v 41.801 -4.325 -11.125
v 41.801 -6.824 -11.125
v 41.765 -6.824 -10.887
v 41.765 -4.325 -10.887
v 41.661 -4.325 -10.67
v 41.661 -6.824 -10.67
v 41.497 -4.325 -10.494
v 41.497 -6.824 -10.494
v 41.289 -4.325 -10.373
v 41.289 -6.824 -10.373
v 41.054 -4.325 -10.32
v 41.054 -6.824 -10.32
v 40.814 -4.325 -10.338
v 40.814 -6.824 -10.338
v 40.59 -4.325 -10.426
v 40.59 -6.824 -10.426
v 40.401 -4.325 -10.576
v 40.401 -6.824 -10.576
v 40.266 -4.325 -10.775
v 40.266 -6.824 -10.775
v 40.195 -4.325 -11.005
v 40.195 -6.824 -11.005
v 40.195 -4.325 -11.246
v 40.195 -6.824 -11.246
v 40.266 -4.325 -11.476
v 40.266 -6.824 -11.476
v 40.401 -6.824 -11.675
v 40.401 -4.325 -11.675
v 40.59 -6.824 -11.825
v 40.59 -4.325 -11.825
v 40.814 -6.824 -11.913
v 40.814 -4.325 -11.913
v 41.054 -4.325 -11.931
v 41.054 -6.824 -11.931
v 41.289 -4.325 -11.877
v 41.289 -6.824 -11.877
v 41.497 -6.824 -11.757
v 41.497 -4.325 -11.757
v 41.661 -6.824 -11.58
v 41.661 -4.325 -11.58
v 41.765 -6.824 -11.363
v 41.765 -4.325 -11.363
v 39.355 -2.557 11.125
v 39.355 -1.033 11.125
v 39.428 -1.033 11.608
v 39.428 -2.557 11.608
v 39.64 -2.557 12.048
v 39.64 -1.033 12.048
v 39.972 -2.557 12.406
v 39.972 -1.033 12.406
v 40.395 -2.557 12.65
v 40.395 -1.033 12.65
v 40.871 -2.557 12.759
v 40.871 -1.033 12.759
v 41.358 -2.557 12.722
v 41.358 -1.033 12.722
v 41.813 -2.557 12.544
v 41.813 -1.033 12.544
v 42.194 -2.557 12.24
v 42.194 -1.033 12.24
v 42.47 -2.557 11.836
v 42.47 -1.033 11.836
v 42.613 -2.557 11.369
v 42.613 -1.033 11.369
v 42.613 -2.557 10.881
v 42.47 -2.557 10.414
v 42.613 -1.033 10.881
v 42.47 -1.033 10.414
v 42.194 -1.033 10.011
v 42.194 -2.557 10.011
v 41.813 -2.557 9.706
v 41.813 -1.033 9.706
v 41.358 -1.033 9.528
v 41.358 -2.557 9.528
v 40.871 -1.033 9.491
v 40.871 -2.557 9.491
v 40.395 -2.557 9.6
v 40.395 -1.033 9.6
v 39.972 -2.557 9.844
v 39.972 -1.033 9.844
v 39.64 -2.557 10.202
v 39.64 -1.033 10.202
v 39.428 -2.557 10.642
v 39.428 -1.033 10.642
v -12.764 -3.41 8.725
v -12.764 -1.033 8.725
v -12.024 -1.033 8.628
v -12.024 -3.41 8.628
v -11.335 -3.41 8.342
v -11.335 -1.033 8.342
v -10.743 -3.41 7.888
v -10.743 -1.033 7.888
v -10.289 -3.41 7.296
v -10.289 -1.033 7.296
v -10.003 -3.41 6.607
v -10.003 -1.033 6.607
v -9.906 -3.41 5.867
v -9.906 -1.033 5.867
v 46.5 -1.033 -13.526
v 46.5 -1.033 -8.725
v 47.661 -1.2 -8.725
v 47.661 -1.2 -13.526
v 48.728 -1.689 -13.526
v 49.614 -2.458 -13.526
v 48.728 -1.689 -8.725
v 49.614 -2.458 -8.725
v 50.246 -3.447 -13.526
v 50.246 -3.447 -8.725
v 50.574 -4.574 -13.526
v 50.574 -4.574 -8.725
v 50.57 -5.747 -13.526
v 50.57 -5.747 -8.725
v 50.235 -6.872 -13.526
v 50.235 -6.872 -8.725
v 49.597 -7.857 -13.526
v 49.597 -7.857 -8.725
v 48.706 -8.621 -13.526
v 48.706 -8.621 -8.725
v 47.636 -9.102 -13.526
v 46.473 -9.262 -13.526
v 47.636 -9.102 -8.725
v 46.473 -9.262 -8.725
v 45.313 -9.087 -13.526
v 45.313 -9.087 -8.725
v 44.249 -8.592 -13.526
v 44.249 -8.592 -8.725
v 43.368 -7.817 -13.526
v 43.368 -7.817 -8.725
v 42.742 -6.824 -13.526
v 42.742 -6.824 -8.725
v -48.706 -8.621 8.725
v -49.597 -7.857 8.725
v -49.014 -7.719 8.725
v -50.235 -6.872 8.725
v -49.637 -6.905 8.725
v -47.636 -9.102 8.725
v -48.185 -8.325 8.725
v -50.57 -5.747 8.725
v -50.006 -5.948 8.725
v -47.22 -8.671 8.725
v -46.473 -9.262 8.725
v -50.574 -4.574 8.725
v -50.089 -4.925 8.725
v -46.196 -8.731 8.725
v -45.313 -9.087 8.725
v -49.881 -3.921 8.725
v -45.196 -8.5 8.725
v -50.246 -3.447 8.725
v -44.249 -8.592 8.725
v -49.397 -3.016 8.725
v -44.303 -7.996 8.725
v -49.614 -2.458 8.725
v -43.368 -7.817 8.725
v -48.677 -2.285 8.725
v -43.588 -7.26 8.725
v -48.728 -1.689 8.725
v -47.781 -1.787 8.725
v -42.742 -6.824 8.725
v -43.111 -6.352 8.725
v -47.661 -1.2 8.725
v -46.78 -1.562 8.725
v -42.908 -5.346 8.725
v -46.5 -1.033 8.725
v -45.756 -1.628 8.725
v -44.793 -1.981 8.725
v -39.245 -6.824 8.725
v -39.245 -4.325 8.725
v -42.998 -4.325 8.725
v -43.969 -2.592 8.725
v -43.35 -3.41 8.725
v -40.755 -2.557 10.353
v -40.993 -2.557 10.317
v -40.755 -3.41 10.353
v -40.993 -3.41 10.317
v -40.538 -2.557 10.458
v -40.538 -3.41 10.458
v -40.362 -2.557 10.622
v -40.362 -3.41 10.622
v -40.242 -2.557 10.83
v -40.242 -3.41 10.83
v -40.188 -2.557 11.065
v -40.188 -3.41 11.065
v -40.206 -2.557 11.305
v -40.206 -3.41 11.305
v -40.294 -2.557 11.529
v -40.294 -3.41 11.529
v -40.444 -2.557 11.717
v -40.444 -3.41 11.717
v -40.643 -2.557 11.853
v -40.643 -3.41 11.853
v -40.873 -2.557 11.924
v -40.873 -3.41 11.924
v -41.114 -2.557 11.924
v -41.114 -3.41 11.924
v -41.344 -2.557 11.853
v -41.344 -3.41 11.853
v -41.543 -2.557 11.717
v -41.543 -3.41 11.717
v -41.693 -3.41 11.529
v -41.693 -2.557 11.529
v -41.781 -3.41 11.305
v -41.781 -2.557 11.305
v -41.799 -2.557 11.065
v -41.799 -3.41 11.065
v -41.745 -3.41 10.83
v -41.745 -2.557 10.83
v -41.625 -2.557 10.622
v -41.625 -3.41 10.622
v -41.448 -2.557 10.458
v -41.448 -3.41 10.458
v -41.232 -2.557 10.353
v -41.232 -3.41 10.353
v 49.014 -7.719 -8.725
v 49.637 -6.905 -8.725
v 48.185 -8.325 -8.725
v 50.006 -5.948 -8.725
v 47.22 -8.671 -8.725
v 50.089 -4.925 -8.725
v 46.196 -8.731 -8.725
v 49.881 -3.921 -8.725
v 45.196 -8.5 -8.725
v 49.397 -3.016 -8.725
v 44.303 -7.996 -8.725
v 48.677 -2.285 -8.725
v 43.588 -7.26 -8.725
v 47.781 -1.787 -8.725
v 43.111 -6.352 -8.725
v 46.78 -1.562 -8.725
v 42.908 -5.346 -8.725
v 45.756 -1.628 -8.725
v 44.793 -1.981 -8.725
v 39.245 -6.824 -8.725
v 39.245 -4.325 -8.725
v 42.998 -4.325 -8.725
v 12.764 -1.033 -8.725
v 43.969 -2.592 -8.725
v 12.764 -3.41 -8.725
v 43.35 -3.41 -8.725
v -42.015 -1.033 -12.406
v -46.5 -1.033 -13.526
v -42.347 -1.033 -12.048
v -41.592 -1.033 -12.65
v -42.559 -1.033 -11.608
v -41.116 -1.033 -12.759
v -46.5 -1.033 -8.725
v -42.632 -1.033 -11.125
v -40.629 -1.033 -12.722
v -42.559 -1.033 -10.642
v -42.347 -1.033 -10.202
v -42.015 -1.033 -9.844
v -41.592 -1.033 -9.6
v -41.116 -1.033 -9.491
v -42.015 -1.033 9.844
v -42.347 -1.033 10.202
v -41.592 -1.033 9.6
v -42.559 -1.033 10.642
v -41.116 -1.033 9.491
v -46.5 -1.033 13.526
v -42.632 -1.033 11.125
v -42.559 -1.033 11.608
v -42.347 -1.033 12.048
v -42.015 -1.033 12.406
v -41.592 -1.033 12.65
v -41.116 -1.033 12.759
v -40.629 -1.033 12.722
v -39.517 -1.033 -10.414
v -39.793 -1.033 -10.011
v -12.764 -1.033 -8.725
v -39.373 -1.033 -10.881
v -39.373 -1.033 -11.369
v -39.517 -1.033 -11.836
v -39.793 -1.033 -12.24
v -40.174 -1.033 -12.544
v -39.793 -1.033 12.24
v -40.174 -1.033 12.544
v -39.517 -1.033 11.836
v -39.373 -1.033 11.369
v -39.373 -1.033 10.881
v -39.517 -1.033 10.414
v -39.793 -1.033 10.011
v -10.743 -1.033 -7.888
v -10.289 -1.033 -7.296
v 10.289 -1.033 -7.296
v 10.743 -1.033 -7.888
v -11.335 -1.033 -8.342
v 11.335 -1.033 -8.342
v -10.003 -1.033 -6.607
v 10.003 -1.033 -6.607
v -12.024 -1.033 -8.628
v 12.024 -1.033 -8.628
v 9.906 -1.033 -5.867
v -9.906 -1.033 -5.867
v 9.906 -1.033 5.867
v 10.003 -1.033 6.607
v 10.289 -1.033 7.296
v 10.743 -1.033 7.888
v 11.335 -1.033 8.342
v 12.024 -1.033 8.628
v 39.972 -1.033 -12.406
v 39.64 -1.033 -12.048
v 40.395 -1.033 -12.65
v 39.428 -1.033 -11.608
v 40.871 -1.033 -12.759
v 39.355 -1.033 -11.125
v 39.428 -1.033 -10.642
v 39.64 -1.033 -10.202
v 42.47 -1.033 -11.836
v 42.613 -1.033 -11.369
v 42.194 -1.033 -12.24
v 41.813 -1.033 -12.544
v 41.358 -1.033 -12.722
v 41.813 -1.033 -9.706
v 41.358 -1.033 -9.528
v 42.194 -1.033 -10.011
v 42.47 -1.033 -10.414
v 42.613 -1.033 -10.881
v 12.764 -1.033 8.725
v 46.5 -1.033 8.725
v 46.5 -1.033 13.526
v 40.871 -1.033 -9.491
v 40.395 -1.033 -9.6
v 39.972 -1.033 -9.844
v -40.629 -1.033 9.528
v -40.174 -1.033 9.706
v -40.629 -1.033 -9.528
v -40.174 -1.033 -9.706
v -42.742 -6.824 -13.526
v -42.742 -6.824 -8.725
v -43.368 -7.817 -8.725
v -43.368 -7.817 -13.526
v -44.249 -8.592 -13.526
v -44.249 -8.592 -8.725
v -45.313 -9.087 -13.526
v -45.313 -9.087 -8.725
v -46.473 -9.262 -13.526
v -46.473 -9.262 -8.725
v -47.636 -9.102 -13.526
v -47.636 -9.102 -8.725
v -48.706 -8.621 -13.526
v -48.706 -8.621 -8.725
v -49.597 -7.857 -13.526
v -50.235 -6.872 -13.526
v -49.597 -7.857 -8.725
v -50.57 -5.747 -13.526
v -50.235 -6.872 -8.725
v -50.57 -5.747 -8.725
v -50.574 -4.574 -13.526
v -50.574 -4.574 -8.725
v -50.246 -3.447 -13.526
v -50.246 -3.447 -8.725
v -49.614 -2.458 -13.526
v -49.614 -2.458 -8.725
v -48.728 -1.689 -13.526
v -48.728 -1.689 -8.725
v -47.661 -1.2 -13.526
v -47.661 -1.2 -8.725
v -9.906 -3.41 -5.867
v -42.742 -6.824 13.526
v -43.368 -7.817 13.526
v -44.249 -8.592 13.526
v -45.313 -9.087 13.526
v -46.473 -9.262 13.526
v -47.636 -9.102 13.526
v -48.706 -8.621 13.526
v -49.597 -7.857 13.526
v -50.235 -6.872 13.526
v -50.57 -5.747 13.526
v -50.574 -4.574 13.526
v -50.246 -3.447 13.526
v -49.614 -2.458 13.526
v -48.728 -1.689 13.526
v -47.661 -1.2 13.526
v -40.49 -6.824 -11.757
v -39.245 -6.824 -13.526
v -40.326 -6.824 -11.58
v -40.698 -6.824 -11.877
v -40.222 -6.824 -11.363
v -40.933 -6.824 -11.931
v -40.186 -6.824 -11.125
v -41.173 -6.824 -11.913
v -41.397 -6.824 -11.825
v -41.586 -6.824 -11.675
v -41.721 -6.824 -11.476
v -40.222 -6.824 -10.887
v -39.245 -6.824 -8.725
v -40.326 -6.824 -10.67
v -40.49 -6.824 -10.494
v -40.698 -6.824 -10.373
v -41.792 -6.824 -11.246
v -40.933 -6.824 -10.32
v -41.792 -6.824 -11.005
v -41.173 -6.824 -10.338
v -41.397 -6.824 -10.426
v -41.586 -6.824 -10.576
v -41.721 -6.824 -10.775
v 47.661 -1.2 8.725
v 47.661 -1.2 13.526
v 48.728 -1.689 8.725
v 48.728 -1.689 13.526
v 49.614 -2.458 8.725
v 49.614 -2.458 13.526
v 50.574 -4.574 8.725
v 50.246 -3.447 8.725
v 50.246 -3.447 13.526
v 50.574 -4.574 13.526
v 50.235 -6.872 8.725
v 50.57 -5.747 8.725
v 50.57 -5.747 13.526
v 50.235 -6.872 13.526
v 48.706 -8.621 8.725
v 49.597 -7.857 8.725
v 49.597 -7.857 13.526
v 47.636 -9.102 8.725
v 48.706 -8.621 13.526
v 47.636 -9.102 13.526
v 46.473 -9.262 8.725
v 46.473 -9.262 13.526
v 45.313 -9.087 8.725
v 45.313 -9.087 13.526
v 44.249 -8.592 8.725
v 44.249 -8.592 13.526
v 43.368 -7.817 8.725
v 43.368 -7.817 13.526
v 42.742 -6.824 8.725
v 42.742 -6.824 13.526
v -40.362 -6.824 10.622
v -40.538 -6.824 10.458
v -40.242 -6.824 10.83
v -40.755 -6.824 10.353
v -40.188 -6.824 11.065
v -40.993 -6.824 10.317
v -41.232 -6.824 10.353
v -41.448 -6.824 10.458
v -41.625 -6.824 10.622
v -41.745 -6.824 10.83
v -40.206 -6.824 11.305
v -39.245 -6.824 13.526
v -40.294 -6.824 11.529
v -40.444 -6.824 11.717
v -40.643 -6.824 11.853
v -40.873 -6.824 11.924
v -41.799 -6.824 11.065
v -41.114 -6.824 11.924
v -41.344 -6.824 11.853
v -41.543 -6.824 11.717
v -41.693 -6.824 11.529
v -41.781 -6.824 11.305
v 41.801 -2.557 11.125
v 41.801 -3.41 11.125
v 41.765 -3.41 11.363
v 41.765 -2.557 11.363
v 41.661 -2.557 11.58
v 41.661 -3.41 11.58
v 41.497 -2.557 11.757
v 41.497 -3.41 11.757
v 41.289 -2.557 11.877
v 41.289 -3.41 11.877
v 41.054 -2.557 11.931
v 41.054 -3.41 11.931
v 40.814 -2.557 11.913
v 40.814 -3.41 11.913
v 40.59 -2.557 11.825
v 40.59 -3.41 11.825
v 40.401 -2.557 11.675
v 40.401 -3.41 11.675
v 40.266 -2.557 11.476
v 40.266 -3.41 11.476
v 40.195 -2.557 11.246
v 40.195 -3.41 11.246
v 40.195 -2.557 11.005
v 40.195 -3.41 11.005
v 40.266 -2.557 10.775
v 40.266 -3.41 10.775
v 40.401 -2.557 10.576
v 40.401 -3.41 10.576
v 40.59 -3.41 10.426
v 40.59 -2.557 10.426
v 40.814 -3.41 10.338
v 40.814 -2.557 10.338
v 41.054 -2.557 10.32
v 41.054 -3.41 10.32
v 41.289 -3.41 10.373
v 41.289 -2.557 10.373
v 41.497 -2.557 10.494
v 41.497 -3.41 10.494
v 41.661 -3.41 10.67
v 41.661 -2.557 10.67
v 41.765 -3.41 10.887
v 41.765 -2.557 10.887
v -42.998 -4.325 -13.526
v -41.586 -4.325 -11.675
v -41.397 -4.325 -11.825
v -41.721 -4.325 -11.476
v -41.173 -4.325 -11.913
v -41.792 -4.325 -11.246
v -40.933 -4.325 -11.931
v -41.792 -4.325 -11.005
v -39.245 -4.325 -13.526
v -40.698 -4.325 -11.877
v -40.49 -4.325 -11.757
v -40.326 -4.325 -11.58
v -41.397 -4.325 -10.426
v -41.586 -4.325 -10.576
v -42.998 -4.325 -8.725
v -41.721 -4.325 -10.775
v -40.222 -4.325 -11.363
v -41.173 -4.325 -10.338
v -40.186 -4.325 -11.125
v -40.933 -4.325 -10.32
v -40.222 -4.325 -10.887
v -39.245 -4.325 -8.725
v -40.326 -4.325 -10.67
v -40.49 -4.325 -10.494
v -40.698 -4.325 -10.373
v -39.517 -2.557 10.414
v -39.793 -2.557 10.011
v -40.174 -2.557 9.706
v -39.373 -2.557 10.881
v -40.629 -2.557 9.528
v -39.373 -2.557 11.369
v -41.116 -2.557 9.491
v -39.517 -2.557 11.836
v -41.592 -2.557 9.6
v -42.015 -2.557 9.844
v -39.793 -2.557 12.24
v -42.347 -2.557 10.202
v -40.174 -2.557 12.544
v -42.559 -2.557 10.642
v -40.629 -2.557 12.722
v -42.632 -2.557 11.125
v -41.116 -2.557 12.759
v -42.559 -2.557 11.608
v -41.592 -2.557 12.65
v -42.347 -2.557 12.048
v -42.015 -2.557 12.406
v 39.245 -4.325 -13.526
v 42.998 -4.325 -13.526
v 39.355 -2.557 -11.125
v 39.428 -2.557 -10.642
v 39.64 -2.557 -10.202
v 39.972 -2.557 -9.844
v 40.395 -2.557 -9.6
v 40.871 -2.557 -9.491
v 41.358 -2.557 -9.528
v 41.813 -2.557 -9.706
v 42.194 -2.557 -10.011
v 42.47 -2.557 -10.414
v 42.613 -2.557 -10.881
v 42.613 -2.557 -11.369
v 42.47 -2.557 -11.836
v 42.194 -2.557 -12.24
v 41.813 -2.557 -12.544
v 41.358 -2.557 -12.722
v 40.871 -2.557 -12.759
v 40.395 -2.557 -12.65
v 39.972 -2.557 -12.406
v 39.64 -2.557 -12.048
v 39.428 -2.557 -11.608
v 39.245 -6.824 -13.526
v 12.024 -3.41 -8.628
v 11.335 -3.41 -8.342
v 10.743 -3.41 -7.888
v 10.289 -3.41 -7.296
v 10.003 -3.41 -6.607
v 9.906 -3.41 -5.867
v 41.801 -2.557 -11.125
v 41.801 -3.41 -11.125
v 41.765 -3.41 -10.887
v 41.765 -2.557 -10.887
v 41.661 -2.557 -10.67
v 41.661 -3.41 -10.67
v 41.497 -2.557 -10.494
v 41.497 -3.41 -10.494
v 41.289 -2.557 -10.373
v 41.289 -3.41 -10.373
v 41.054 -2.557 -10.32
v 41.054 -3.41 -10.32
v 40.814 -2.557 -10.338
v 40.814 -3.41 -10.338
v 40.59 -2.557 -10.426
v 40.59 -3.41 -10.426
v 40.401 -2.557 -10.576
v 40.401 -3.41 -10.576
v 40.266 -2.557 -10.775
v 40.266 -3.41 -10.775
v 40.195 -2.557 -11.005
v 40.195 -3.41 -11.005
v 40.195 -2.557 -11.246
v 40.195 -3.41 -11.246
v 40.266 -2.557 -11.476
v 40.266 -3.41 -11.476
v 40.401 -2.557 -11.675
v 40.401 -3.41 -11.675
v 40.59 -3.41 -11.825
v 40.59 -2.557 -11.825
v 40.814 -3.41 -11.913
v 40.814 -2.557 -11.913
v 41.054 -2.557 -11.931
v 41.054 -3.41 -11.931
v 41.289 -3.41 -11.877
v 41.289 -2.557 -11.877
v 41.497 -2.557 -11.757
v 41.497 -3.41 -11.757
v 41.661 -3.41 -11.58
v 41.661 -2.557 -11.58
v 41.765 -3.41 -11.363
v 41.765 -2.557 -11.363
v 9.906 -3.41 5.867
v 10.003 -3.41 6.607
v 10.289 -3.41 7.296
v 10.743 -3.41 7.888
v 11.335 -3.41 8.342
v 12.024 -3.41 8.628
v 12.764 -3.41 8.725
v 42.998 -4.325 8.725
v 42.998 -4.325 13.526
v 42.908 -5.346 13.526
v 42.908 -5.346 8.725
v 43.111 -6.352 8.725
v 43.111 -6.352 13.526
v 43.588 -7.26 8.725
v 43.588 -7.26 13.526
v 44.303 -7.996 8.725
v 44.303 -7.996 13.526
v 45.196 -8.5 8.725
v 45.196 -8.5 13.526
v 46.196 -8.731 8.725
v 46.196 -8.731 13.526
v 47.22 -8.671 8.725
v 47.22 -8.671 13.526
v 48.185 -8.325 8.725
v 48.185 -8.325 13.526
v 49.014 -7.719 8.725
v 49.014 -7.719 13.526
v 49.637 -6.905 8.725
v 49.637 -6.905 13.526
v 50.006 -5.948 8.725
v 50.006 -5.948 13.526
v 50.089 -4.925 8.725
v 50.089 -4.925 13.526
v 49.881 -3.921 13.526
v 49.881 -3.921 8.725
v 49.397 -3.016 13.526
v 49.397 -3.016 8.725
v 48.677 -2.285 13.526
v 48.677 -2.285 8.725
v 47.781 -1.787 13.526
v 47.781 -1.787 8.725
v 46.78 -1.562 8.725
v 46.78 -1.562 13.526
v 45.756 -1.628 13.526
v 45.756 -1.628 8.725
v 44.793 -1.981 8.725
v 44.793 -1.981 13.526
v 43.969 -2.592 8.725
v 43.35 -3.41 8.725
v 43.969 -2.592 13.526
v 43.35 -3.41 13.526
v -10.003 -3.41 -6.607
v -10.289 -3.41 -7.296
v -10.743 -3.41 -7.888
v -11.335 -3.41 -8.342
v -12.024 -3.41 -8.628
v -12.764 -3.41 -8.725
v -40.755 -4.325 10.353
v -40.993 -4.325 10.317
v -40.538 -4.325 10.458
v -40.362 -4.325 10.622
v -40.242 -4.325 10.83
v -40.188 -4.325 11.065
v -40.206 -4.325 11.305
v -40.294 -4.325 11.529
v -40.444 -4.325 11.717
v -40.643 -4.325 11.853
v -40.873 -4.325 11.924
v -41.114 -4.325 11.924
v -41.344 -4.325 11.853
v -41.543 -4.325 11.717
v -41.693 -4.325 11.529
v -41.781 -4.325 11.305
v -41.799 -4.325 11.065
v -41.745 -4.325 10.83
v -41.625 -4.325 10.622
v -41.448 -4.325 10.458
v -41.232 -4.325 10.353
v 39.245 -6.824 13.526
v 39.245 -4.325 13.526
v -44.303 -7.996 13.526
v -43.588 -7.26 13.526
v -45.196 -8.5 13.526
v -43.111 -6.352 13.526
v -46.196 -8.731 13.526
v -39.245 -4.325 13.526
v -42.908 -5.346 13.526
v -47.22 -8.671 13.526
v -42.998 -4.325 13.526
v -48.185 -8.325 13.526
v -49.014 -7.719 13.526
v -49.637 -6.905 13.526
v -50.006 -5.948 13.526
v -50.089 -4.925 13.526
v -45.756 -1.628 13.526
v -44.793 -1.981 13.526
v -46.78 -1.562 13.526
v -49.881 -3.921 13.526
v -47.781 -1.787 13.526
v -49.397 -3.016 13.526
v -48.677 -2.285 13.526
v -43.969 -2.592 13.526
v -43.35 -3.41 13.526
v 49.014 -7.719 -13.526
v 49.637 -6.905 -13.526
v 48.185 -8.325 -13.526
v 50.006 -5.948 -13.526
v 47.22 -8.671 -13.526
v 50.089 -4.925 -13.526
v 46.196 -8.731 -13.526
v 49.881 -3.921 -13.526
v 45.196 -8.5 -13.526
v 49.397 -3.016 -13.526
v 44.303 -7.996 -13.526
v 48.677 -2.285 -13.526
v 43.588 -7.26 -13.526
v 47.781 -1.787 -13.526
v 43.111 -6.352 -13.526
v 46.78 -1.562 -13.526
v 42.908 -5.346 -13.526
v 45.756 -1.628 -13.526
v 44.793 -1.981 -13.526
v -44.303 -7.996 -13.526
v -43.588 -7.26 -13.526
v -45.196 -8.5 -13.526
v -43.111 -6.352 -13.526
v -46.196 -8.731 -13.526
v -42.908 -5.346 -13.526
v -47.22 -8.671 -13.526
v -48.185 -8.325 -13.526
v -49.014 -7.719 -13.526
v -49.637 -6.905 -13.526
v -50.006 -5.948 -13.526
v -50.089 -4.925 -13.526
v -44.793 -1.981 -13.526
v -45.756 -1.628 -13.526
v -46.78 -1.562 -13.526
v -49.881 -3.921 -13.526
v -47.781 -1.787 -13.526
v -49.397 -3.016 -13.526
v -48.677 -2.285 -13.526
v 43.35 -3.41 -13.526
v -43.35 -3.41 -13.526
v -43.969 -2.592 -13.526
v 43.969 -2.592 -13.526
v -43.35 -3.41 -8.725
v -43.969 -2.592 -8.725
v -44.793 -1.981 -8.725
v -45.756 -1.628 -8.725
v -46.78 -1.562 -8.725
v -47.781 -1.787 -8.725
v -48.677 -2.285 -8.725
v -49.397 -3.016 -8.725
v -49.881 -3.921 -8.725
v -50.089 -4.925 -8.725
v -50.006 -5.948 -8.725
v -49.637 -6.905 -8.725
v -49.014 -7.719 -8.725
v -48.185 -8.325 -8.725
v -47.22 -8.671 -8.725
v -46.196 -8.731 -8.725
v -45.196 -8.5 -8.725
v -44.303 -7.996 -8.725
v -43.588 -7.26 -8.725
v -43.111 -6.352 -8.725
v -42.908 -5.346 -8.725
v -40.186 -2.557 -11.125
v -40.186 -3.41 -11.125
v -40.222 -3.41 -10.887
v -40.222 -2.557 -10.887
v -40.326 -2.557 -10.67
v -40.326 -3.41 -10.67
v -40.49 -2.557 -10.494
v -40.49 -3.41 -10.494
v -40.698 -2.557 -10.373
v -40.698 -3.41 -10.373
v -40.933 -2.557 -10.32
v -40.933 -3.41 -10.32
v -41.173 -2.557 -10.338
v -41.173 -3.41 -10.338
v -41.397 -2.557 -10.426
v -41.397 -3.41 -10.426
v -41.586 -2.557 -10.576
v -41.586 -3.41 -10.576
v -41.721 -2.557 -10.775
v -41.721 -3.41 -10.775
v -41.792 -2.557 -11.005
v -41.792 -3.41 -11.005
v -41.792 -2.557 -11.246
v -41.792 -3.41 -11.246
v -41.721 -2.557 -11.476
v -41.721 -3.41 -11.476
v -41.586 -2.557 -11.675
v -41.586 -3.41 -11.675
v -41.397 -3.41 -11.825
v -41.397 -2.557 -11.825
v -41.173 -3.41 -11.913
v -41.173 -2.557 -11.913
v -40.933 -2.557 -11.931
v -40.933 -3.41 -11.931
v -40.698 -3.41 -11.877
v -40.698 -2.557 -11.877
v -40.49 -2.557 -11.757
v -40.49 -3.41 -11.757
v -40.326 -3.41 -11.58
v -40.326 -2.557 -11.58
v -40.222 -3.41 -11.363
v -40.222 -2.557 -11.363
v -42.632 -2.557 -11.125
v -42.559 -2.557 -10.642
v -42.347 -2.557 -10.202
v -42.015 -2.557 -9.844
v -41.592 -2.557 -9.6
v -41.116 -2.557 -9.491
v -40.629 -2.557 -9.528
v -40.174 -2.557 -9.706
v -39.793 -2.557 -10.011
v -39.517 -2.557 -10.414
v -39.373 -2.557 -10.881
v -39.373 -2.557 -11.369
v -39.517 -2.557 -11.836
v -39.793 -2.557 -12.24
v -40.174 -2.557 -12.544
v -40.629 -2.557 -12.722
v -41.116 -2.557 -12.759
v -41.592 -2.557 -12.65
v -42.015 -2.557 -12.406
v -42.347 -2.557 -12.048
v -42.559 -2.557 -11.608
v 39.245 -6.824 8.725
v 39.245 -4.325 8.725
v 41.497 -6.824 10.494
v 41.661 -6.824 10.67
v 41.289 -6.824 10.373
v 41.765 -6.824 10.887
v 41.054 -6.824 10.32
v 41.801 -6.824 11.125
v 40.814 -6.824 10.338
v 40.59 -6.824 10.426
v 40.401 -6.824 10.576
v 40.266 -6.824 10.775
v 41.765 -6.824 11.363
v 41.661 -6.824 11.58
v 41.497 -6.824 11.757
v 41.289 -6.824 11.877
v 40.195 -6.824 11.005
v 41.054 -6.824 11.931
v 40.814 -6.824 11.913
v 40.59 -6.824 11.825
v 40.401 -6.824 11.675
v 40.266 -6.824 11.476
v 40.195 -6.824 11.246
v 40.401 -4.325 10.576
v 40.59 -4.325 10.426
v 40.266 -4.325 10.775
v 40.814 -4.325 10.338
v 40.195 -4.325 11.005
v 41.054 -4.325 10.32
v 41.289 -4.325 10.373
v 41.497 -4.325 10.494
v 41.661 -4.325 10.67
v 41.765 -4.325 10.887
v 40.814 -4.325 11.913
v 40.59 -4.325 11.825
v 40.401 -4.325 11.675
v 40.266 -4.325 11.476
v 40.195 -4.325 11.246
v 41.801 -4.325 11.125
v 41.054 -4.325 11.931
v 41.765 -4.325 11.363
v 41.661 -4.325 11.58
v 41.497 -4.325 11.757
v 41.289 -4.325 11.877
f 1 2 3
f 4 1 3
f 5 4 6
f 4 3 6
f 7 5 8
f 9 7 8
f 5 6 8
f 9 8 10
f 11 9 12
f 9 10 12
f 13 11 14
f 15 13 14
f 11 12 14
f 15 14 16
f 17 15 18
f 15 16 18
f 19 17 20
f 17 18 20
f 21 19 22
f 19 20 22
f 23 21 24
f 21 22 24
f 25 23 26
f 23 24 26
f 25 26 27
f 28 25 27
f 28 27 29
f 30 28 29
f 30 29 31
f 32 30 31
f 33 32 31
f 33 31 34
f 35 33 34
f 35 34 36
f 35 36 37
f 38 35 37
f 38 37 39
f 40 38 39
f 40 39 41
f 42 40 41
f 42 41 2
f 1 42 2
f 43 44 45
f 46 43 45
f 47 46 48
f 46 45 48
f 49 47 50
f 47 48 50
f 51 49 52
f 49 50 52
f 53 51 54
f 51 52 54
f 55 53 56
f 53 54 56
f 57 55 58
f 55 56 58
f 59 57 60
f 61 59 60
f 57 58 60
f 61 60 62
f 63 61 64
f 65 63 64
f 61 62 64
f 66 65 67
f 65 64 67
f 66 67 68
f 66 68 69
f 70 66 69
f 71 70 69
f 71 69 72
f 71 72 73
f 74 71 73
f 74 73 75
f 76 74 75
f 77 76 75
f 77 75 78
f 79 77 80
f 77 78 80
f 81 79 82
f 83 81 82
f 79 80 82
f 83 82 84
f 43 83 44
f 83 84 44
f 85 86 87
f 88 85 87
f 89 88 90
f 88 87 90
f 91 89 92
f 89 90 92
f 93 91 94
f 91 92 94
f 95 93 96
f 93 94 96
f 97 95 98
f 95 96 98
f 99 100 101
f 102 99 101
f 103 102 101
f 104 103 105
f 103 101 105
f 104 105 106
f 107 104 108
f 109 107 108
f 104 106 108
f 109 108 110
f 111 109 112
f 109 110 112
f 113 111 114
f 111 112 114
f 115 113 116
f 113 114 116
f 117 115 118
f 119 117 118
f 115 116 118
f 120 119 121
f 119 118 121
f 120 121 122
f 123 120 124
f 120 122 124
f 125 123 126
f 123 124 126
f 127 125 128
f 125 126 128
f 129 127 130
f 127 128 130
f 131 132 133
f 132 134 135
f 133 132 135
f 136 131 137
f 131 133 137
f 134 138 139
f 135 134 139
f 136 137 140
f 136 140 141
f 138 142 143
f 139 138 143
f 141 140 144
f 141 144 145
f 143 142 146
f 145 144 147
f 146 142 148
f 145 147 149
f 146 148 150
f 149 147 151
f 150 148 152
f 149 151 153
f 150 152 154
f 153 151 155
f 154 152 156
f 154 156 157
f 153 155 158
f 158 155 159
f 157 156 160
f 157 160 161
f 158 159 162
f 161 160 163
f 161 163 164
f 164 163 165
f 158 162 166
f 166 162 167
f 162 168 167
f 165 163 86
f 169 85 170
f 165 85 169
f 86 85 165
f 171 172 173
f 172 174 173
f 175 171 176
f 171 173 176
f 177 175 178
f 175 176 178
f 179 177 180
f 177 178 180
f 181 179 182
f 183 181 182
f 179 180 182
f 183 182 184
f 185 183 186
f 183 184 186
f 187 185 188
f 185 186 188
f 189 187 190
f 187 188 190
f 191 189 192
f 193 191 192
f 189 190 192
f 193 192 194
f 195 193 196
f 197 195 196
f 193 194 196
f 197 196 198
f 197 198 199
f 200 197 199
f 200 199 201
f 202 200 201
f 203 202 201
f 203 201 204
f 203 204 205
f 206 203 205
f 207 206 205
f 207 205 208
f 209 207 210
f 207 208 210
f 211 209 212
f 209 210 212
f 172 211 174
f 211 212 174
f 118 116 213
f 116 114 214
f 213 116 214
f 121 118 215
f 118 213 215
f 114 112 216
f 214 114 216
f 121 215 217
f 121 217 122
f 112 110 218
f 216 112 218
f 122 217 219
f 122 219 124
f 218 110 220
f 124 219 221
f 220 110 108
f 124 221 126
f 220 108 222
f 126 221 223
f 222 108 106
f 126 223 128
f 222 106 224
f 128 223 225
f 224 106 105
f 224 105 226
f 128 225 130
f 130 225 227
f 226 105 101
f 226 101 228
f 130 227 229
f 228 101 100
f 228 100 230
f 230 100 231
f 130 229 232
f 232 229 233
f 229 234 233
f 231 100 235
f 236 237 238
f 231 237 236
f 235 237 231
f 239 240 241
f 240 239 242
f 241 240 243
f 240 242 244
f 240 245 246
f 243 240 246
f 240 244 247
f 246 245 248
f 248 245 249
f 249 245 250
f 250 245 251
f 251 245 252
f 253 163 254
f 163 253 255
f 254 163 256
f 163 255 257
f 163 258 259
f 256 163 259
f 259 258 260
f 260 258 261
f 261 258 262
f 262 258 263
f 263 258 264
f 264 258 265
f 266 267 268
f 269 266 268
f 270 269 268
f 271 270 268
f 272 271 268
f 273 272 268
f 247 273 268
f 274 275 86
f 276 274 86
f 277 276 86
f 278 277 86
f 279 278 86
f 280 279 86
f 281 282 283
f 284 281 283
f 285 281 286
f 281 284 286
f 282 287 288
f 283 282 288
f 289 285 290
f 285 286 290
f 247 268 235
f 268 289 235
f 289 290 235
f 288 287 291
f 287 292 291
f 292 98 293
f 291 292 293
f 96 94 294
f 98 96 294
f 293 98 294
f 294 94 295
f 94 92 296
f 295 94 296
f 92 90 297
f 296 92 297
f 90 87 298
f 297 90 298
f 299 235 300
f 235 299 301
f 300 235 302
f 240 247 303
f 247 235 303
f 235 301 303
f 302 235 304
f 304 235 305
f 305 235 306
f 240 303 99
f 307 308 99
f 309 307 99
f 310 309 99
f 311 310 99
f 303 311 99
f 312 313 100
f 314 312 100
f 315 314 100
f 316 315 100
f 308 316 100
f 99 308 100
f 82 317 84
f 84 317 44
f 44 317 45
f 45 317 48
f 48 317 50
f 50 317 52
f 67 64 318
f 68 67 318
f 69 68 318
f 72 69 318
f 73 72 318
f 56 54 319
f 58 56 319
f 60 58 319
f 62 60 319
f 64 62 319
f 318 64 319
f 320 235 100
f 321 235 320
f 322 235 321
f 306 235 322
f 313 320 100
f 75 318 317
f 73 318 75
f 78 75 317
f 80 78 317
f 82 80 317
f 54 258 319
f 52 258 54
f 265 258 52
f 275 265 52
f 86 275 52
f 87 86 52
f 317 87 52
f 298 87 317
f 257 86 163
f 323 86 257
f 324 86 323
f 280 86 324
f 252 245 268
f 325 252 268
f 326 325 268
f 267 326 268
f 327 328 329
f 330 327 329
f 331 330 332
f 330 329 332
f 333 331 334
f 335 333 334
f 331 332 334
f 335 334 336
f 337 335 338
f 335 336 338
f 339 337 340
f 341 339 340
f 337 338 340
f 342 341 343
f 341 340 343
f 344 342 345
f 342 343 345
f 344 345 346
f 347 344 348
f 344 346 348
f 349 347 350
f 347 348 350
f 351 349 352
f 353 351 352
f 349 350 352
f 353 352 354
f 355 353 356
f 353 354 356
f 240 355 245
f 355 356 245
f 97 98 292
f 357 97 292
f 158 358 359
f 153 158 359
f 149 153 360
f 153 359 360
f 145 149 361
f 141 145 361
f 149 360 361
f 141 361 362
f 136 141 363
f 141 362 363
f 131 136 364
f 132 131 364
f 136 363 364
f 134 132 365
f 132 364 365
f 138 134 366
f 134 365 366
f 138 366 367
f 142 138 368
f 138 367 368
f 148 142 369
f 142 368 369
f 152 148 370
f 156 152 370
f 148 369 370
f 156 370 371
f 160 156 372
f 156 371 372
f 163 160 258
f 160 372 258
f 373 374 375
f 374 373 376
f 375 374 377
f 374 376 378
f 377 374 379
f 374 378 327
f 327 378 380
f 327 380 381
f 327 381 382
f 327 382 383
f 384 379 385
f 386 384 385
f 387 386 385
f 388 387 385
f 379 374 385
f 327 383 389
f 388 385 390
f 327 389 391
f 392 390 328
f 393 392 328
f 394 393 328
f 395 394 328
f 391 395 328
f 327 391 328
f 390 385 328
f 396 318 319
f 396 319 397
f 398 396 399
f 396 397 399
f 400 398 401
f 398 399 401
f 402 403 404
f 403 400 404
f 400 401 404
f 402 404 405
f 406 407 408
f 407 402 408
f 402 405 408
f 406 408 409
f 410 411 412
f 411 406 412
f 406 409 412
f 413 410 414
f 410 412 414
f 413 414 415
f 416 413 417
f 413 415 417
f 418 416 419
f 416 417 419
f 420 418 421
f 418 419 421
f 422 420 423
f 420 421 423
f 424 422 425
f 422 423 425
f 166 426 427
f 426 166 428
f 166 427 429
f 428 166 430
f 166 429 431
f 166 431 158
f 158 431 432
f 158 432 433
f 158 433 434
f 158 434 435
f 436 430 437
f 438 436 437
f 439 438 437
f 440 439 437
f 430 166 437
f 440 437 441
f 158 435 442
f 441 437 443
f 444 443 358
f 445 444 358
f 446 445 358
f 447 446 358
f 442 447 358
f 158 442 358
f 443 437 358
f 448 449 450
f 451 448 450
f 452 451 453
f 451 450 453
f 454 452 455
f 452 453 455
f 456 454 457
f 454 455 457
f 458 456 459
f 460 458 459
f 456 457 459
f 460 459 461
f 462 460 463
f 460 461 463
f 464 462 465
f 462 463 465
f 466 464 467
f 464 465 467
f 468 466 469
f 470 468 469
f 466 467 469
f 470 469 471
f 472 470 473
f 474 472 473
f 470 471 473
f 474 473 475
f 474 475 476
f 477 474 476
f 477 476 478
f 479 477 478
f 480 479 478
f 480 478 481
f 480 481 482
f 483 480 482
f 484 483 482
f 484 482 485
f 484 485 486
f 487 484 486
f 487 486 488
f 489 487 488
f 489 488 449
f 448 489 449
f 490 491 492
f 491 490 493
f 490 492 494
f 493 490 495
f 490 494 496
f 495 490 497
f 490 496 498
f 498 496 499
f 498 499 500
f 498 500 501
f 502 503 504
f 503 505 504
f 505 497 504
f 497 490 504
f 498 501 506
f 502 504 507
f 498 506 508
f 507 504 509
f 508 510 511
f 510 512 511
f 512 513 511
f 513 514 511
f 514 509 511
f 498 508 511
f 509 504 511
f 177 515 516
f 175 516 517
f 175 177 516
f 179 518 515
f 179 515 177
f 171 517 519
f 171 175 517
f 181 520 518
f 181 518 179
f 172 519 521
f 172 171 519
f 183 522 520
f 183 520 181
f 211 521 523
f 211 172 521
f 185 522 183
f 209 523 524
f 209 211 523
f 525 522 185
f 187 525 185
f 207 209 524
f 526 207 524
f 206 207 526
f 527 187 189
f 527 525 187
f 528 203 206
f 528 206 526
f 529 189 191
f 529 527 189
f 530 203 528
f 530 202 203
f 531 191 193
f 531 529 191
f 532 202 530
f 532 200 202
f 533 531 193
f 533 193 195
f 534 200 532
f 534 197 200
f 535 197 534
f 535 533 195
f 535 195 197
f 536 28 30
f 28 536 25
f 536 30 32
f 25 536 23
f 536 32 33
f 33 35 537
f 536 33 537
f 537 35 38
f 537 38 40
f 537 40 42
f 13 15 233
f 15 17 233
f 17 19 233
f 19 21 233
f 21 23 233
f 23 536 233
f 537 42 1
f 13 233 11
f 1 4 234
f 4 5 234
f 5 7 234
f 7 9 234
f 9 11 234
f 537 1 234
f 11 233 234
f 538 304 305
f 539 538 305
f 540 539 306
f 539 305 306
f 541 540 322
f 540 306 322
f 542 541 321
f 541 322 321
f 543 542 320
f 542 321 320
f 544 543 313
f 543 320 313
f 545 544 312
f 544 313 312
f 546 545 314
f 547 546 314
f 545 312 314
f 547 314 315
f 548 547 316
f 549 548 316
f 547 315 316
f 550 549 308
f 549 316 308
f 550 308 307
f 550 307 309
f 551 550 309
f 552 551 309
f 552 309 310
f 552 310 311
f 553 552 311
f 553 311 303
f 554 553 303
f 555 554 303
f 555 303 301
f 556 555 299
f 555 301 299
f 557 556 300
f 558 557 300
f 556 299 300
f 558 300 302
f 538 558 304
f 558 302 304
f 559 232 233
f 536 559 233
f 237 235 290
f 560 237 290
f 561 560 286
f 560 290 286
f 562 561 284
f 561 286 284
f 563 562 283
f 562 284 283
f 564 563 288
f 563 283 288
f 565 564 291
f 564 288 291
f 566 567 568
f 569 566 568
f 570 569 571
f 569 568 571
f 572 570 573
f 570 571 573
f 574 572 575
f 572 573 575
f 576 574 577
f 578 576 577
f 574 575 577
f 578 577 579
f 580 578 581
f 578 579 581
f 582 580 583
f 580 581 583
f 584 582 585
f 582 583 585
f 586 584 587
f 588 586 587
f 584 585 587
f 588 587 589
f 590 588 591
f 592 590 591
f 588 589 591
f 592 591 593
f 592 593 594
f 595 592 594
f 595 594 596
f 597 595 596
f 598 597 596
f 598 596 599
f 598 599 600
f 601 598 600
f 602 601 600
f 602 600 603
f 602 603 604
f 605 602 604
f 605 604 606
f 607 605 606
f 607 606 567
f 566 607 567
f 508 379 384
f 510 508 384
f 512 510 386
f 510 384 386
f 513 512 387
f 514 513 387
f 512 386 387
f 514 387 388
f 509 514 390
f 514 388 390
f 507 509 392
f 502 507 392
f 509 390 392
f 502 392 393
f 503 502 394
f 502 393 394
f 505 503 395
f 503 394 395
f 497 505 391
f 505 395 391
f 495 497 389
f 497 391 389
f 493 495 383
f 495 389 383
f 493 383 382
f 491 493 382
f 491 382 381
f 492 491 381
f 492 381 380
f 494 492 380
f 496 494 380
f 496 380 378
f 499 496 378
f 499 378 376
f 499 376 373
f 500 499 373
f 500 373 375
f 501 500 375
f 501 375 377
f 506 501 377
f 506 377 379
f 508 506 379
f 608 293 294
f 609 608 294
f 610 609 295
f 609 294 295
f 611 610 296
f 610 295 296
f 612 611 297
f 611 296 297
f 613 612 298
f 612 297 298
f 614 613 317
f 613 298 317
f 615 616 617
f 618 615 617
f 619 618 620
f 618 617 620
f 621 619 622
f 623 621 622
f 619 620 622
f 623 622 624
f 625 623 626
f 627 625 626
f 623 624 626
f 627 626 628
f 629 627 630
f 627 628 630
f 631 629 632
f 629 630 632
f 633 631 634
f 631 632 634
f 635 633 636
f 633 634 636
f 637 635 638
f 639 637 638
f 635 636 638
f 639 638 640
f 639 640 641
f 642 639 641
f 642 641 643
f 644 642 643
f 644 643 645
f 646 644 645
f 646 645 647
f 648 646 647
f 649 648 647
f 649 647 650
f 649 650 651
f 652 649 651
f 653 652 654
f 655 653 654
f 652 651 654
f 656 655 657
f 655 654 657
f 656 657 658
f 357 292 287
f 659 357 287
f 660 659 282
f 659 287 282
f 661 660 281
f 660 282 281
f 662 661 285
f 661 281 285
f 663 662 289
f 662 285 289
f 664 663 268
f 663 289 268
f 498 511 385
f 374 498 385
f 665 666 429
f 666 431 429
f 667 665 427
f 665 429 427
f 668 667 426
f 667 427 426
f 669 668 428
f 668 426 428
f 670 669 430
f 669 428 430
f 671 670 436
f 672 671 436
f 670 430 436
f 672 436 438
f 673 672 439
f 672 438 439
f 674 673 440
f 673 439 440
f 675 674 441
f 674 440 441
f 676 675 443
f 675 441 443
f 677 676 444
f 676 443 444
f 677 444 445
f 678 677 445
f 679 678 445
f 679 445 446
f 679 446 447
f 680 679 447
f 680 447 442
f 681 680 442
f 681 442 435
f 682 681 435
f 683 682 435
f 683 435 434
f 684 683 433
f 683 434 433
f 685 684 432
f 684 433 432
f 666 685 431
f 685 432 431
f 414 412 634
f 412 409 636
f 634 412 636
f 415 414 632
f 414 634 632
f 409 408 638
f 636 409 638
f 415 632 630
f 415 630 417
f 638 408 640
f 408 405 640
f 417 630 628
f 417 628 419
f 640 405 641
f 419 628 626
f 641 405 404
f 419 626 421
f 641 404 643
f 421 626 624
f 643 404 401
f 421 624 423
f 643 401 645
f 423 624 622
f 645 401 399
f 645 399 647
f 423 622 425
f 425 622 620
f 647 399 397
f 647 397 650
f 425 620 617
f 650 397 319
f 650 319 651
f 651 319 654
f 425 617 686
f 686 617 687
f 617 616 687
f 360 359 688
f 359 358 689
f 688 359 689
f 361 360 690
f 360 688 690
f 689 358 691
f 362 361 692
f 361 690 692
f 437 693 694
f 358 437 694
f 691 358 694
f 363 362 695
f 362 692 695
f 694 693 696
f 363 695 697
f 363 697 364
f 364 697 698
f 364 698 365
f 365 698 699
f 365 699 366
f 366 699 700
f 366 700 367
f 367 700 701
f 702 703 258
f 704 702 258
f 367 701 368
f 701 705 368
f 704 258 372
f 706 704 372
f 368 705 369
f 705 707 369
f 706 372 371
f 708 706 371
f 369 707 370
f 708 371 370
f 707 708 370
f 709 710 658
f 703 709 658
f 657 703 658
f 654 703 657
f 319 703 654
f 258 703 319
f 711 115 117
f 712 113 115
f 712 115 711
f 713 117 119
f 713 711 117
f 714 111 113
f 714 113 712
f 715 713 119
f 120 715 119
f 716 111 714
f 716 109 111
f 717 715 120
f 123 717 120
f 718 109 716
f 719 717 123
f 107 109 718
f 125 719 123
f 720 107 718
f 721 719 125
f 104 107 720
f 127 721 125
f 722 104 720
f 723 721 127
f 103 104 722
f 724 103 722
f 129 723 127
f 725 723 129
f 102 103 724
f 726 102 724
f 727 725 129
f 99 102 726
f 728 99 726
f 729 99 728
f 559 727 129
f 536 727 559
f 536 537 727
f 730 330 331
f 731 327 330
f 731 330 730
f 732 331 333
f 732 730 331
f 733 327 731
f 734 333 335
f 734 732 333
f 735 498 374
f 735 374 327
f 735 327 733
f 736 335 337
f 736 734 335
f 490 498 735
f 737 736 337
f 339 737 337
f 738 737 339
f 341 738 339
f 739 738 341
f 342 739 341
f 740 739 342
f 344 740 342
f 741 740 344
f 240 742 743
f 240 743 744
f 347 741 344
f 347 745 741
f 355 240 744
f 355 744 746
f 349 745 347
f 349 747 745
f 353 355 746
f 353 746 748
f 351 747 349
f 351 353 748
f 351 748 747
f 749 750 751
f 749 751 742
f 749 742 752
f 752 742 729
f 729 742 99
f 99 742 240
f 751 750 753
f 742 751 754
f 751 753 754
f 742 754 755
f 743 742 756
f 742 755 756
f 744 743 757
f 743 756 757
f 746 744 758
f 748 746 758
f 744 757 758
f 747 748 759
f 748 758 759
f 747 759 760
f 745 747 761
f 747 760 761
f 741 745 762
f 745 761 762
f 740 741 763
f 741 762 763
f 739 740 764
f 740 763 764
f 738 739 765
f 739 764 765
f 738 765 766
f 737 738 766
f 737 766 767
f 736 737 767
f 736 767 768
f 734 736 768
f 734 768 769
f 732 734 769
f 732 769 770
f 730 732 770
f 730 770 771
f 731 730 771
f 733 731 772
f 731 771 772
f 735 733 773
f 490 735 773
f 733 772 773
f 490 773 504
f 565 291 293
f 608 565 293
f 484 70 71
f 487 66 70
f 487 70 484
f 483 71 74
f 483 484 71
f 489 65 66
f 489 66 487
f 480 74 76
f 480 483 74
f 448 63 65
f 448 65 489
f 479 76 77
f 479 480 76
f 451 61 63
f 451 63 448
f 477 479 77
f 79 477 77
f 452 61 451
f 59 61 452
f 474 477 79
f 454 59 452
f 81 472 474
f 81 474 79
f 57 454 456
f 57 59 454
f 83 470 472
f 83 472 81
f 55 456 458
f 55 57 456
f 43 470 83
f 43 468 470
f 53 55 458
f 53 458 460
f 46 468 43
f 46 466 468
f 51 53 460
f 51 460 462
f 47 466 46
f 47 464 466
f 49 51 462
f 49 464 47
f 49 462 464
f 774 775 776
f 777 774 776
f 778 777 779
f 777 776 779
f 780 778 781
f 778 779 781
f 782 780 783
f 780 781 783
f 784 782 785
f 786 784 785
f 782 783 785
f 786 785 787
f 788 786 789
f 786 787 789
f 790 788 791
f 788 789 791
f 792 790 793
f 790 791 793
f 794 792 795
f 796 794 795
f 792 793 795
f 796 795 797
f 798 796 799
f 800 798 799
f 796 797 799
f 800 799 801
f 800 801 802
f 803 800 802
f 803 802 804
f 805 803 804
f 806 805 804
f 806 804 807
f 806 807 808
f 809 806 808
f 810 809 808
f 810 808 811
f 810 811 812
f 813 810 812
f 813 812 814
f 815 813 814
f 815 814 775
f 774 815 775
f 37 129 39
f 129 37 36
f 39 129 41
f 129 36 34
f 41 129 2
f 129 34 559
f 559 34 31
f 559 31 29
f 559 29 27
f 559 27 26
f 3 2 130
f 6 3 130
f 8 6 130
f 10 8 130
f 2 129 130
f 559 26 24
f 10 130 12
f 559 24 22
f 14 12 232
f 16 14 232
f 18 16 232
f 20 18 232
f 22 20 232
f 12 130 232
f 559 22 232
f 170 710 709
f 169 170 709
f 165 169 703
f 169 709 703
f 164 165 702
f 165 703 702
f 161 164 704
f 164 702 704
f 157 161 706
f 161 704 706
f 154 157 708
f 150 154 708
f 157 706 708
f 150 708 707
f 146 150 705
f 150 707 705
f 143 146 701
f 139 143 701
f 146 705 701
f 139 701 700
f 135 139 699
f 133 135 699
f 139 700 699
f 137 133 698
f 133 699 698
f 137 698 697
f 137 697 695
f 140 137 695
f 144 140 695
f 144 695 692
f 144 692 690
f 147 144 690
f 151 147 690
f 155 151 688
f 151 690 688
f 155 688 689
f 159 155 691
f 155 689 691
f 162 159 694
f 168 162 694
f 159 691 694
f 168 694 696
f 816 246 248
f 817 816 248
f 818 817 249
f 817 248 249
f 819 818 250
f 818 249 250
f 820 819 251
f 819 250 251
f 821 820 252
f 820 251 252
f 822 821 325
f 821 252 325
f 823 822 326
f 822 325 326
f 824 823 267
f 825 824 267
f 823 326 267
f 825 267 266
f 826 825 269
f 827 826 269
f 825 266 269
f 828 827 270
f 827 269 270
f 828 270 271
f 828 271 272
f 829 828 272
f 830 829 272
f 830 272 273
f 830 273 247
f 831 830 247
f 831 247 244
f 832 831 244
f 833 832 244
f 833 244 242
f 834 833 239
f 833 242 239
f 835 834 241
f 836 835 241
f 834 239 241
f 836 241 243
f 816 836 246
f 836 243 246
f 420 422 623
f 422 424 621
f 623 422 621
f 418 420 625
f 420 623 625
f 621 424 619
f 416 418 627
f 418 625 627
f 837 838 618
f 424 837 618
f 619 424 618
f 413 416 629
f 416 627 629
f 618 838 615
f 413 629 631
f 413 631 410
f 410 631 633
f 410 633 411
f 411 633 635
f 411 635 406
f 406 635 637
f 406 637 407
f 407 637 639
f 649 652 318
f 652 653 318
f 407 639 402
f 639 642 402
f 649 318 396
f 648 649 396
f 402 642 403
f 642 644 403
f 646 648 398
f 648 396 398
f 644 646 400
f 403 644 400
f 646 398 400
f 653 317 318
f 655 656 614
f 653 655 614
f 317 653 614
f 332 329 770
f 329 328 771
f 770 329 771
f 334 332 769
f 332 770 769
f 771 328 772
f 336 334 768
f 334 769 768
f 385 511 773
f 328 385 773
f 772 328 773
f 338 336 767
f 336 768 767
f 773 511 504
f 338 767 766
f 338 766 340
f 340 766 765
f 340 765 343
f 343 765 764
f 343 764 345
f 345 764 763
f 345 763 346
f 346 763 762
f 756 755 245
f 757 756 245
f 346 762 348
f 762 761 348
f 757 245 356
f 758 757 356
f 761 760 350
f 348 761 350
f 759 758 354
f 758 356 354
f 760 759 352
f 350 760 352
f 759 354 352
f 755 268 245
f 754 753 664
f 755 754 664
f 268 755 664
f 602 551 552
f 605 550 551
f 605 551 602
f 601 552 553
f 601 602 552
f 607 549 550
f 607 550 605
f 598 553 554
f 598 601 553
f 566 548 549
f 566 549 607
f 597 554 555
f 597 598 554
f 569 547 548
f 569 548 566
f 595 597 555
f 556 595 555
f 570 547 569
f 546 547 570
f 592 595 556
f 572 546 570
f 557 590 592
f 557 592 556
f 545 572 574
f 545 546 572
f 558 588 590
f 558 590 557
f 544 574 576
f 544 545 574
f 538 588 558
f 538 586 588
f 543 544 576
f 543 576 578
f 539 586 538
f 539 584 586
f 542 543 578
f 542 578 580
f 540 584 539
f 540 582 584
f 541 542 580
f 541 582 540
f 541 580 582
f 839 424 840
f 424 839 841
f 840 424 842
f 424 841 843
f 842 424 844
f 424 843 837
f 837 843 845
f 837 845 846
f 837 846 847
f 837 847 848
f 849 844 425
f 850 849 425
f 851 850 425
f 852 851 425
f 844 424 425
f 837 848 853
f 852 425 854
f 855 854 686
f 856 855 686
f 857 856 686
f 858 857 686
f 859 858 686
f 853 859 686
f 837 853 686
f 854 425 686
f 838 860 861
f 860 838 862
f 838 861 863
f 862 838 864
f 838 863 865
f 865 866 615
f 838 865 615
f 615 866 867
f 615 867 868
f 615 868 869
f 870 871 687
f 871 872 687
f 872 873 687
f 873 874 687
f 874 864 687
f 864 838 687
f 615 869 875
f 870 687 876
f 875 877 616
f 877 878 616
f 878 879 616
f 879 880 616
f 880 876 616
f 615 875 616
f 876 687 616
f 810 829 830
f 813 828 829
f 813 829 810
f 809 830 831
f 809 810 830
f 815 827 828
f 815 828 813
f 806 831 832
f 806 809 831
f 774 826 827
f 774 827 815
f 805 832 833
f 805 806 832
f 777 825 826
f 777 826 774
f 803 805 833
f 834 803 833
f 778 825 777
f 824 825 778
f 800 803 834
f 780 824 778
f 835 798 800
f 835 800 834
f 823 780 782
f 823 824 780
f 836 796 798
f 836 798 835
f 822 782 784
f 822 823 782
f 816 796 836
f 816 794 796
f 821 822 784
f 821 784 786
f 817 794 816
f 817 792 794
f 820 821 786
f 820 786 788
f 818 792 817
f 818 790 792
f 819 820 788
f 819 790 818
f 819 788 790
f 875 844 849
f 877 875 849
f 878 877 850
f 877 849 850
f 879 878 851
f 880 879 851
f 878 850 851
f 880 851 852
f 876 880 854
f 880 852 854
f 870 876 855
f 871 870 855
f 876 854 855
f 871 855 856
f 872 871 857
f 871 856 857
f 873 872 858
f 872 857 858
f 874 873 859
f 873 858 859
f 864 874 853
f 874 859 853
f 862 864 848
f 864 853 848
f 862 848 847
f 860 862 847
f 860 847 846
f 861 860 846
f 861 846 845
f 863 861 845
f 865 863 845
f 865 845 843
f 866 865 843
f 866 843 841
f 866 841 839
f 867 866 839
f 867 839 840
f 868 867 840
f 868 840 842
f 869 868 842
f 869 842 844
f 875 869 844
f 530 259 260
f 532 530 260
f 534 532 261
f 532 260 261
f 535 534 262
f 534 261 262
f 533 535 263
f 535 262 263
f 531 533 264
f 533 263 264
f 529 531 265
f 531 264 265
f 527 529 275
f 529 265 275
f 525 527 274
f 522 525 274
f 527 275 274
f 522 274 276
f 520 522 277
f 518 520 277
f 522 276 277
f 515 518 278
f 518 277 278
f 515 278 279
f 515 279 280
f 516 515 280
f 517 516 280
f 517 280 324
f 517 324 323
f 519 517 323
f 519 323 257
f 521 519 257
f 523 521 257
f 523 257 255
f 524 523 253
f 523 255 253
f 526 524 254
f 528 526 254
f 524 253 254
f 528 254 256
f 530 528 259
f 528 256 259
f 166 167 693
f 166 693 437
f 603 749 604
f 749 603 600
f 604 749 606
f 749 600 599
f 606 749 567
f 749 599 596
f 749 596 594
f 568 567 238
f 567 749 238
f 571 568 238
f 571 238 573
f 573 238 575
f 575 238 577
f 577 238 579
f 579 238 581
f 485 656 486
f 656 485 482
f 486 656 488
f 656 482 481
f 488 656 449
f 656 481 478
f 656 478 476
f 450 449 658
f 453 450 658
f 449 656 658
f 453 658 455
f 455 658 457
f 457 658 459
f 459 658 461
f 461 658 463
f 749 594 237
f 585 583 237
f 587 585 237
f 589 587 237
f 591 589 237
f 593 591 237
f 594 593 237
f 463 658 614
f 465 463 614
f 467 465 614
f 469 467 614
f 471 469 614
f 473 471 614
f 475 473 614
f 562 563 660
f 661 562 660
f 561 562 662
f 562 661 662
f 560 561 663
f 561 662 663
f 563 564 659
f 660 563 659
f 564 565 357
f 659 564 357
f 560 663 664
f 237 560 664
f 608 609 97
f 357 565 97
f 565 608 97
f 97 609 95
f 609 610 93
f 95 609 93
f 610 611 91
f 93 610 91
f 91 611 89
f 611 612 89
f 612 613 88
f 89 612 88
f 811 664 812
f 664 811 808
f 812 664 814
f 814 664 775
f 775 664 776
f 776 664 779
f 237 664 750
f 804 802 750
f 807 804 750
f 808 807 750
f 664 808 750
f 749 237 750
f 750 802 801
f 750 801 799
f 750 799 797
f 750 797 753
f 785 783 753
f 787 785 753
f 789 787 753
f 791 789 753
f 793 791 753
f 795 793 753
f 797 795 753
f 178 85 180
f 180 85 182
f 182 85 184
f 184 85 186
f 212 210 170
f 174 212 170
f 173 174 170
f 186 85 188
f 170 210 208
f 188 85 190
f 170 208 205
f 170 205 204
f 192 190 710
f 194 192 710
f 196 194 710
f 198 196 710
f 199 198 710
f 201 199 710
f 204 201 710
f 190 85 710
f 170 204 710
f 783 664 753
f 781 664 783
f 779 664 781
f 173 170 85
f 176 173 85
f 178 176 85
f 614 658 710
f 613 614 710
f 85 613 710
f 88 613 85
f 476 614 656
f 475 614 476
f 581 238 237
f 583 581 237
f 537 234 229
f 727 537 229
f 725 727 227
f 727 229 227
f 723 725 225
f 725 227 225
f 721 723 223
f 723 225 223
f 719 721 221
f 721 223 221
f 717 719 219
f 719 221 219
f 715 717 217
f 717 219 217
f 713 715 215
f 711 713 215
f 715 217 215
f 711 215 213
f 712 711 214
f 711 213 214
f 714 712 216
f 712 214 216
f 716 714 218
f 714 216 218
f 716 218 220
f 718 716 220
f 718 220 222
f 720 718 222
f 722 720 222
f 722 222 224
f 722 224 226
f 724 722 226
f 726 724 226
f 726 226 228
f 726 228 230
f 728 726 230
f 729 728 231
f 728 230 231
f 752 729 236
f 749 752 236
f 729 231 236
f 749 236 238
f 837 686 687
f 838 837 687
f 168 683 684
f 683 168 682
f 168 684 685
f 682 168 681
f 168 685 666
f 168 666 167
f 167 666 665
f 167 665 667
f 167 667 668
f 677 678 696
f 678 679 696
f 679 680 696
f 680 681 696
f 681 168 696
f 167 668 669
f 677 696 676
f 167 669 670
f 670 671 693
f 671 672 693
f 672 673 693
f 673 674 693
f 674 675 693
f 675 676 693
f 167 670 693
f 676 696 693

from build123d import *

# Parameters (mm, degrees)
BOSS_EXTRUDE1_DEPTH = 22.5425
CUT_EXTRUDE1_DEPTH  = 14.605
SKETCH3_R           = 1.3462
CUT_EXTRUDE2_DEPTH  = 11.1125
SKETCH4_R           = 2.7305
CUT_EXTRUDE3_DEPTH  = 2.54
SCALE1_SCALE        = 0.6


with BuildPart() as part:
    # Sketch1 → Boss-Extrude1 (new, symmetric)
    with BuildSketch(Plane.XY):
        with BuildLine():
            Line((-77.49921, 0), (77.49921, 0))
            ThreePointArc((77.49921, 0), (83.25218384, -10.591022368), (71.236165373, -9.652))
            Line((71.236165373, -9.652), (65.40881, -9.652))
            Line((65.40881, -9.652), (65.40881, -5.4864))
            Line((65.40881, -5.4864), (71.663839849, -5.4864))
            ThreePointArc((71.663839849, -5.4864), (83.093360732, -9.011673362), (72.250559507, -3.9624))
            Line((72.250559507, -3.9624), (-72.250559507, -3.9624))
            ThreePointArc((-72.250559507, -3.9624), (-83.093360732, -9.011673362), (-71.663839849, -5.4864))
            Line((-71.663839849, -5.4864), (-65.40881, -5.4864))
            Line((-65.40881, -5.4864), (-65.40881, -9.652))
            Line((-65.40881, -9.652), (-71.236165373, -9.652))
            ThreePointArc((-71.236165373, -9.652), (-83.25218384, -10.591022368), (-77.49921, 0))
        make_face()
    extrude(amount=BOSS_EXTRUDE1_DEPTH, both=True)

    # Sketch2 → Cut-Extrude1 (cut)
    with BuildSketch(Plane(origin=(0, 0, 0), x_dir=(1, 0, 0), z_dir=(0, 1, 0))):
        with BuildLine():
            Line((84.35721, -14.5415), (84.35721, 14.5415))
            Line((84.35721, 14.5415), (21.2725, 14.5415))
            ThreePointArc((21.2725, 14.5415), (17.904903955, 13.146596045), (16.51, 9.779))
            Line((16.51, 9.779), (16.51, -9.779))
            ThreePointArc((16.51, -9.779), (17.904903955, -13.146596045), (21.2725, -14.5415))
            Line((21.2725, -14.5415), (84.35721, -14.5415))
        make_face()
        with BuildLine():
            Line((-84.35721, 14.5415), (-84.35721, -14.5415))
            Line((-84.35721, -14.5415), (-21.2725, -14.5415))
            ThreePointArc((-21.2725, -14.5415), (-17.904903955, -13.146596045), (-16.51, -9.779))
            Line((-16.51, -9.779), (-16.51, 9.779))
            ThreePointArc((-16.51, 9.779), (-17.904903955, 13.146596045), (-21.2725, 14.5415))
            Line((-21.2725, 14.5415), (-84.35721, 14.5415))
        make_face()
    extrude(amount=-CUT_EXTRUDE1_DEPTH, mode=Mode.SUBTRACT)

    # Sketch3 → Cut-Extrude2 (cut, symmetric)
    with BuildSketch(Plane.XZ.offset(9.652)):
        with Locations((68.322487686, 18.542)):
            Circle(SKETCH3_R)
        with Locations((68.322487686, -18.542)):
            Circle(SKETCH3_R)
        with Locations((-68.322487686, -18.542)):
            Circle(SKETCH3_R)
        with Locations(Location((-68.322487686, 18.542, 0), (0, 0, 270))):
            Circle(SKETCH3_R)
    extrude(amount=CUT_EXTRUDE2_DEPTH, both=True, mode=Mode.SUBTRACT)

    # Sketch4 → Cut-Extrude3 (cut)
    with BuildSketch(Plane(origin=(0, 0, 0), x_dir=(1, 0, 0), z_dir=(0, 1, 0))):
        with Locations(Location((-68.322487686, 18.542, 0), (0, 0, 180))):
            Circle(SKETCH4_R)
        with Locations(Location((-68.322487686, -18.542, 0), (0, 0, 180))):
            Circle(SKETCH4_R)
        with Locations(Location((68.322487686, -18.542, 0), (0, 0, 180))):
            Circle(SKETCH4_R)
        with Locations(Location((68.322487686, 18.542, 0), (0, 0, 180))):
            Circle(SKETCH4_R)
    extrude(amount=-CUT_EXTRUDE3_DEPTH, mode=Mode.SUBTRACT)


with BuildPart() as part_1:
    # Scale1: scaled about (0, -2.581706213, 0)
    add(part.part.scale(SCALE1_SCALE).moved(Location((0, -1.032682485, 0))))


solid = part_1.part
